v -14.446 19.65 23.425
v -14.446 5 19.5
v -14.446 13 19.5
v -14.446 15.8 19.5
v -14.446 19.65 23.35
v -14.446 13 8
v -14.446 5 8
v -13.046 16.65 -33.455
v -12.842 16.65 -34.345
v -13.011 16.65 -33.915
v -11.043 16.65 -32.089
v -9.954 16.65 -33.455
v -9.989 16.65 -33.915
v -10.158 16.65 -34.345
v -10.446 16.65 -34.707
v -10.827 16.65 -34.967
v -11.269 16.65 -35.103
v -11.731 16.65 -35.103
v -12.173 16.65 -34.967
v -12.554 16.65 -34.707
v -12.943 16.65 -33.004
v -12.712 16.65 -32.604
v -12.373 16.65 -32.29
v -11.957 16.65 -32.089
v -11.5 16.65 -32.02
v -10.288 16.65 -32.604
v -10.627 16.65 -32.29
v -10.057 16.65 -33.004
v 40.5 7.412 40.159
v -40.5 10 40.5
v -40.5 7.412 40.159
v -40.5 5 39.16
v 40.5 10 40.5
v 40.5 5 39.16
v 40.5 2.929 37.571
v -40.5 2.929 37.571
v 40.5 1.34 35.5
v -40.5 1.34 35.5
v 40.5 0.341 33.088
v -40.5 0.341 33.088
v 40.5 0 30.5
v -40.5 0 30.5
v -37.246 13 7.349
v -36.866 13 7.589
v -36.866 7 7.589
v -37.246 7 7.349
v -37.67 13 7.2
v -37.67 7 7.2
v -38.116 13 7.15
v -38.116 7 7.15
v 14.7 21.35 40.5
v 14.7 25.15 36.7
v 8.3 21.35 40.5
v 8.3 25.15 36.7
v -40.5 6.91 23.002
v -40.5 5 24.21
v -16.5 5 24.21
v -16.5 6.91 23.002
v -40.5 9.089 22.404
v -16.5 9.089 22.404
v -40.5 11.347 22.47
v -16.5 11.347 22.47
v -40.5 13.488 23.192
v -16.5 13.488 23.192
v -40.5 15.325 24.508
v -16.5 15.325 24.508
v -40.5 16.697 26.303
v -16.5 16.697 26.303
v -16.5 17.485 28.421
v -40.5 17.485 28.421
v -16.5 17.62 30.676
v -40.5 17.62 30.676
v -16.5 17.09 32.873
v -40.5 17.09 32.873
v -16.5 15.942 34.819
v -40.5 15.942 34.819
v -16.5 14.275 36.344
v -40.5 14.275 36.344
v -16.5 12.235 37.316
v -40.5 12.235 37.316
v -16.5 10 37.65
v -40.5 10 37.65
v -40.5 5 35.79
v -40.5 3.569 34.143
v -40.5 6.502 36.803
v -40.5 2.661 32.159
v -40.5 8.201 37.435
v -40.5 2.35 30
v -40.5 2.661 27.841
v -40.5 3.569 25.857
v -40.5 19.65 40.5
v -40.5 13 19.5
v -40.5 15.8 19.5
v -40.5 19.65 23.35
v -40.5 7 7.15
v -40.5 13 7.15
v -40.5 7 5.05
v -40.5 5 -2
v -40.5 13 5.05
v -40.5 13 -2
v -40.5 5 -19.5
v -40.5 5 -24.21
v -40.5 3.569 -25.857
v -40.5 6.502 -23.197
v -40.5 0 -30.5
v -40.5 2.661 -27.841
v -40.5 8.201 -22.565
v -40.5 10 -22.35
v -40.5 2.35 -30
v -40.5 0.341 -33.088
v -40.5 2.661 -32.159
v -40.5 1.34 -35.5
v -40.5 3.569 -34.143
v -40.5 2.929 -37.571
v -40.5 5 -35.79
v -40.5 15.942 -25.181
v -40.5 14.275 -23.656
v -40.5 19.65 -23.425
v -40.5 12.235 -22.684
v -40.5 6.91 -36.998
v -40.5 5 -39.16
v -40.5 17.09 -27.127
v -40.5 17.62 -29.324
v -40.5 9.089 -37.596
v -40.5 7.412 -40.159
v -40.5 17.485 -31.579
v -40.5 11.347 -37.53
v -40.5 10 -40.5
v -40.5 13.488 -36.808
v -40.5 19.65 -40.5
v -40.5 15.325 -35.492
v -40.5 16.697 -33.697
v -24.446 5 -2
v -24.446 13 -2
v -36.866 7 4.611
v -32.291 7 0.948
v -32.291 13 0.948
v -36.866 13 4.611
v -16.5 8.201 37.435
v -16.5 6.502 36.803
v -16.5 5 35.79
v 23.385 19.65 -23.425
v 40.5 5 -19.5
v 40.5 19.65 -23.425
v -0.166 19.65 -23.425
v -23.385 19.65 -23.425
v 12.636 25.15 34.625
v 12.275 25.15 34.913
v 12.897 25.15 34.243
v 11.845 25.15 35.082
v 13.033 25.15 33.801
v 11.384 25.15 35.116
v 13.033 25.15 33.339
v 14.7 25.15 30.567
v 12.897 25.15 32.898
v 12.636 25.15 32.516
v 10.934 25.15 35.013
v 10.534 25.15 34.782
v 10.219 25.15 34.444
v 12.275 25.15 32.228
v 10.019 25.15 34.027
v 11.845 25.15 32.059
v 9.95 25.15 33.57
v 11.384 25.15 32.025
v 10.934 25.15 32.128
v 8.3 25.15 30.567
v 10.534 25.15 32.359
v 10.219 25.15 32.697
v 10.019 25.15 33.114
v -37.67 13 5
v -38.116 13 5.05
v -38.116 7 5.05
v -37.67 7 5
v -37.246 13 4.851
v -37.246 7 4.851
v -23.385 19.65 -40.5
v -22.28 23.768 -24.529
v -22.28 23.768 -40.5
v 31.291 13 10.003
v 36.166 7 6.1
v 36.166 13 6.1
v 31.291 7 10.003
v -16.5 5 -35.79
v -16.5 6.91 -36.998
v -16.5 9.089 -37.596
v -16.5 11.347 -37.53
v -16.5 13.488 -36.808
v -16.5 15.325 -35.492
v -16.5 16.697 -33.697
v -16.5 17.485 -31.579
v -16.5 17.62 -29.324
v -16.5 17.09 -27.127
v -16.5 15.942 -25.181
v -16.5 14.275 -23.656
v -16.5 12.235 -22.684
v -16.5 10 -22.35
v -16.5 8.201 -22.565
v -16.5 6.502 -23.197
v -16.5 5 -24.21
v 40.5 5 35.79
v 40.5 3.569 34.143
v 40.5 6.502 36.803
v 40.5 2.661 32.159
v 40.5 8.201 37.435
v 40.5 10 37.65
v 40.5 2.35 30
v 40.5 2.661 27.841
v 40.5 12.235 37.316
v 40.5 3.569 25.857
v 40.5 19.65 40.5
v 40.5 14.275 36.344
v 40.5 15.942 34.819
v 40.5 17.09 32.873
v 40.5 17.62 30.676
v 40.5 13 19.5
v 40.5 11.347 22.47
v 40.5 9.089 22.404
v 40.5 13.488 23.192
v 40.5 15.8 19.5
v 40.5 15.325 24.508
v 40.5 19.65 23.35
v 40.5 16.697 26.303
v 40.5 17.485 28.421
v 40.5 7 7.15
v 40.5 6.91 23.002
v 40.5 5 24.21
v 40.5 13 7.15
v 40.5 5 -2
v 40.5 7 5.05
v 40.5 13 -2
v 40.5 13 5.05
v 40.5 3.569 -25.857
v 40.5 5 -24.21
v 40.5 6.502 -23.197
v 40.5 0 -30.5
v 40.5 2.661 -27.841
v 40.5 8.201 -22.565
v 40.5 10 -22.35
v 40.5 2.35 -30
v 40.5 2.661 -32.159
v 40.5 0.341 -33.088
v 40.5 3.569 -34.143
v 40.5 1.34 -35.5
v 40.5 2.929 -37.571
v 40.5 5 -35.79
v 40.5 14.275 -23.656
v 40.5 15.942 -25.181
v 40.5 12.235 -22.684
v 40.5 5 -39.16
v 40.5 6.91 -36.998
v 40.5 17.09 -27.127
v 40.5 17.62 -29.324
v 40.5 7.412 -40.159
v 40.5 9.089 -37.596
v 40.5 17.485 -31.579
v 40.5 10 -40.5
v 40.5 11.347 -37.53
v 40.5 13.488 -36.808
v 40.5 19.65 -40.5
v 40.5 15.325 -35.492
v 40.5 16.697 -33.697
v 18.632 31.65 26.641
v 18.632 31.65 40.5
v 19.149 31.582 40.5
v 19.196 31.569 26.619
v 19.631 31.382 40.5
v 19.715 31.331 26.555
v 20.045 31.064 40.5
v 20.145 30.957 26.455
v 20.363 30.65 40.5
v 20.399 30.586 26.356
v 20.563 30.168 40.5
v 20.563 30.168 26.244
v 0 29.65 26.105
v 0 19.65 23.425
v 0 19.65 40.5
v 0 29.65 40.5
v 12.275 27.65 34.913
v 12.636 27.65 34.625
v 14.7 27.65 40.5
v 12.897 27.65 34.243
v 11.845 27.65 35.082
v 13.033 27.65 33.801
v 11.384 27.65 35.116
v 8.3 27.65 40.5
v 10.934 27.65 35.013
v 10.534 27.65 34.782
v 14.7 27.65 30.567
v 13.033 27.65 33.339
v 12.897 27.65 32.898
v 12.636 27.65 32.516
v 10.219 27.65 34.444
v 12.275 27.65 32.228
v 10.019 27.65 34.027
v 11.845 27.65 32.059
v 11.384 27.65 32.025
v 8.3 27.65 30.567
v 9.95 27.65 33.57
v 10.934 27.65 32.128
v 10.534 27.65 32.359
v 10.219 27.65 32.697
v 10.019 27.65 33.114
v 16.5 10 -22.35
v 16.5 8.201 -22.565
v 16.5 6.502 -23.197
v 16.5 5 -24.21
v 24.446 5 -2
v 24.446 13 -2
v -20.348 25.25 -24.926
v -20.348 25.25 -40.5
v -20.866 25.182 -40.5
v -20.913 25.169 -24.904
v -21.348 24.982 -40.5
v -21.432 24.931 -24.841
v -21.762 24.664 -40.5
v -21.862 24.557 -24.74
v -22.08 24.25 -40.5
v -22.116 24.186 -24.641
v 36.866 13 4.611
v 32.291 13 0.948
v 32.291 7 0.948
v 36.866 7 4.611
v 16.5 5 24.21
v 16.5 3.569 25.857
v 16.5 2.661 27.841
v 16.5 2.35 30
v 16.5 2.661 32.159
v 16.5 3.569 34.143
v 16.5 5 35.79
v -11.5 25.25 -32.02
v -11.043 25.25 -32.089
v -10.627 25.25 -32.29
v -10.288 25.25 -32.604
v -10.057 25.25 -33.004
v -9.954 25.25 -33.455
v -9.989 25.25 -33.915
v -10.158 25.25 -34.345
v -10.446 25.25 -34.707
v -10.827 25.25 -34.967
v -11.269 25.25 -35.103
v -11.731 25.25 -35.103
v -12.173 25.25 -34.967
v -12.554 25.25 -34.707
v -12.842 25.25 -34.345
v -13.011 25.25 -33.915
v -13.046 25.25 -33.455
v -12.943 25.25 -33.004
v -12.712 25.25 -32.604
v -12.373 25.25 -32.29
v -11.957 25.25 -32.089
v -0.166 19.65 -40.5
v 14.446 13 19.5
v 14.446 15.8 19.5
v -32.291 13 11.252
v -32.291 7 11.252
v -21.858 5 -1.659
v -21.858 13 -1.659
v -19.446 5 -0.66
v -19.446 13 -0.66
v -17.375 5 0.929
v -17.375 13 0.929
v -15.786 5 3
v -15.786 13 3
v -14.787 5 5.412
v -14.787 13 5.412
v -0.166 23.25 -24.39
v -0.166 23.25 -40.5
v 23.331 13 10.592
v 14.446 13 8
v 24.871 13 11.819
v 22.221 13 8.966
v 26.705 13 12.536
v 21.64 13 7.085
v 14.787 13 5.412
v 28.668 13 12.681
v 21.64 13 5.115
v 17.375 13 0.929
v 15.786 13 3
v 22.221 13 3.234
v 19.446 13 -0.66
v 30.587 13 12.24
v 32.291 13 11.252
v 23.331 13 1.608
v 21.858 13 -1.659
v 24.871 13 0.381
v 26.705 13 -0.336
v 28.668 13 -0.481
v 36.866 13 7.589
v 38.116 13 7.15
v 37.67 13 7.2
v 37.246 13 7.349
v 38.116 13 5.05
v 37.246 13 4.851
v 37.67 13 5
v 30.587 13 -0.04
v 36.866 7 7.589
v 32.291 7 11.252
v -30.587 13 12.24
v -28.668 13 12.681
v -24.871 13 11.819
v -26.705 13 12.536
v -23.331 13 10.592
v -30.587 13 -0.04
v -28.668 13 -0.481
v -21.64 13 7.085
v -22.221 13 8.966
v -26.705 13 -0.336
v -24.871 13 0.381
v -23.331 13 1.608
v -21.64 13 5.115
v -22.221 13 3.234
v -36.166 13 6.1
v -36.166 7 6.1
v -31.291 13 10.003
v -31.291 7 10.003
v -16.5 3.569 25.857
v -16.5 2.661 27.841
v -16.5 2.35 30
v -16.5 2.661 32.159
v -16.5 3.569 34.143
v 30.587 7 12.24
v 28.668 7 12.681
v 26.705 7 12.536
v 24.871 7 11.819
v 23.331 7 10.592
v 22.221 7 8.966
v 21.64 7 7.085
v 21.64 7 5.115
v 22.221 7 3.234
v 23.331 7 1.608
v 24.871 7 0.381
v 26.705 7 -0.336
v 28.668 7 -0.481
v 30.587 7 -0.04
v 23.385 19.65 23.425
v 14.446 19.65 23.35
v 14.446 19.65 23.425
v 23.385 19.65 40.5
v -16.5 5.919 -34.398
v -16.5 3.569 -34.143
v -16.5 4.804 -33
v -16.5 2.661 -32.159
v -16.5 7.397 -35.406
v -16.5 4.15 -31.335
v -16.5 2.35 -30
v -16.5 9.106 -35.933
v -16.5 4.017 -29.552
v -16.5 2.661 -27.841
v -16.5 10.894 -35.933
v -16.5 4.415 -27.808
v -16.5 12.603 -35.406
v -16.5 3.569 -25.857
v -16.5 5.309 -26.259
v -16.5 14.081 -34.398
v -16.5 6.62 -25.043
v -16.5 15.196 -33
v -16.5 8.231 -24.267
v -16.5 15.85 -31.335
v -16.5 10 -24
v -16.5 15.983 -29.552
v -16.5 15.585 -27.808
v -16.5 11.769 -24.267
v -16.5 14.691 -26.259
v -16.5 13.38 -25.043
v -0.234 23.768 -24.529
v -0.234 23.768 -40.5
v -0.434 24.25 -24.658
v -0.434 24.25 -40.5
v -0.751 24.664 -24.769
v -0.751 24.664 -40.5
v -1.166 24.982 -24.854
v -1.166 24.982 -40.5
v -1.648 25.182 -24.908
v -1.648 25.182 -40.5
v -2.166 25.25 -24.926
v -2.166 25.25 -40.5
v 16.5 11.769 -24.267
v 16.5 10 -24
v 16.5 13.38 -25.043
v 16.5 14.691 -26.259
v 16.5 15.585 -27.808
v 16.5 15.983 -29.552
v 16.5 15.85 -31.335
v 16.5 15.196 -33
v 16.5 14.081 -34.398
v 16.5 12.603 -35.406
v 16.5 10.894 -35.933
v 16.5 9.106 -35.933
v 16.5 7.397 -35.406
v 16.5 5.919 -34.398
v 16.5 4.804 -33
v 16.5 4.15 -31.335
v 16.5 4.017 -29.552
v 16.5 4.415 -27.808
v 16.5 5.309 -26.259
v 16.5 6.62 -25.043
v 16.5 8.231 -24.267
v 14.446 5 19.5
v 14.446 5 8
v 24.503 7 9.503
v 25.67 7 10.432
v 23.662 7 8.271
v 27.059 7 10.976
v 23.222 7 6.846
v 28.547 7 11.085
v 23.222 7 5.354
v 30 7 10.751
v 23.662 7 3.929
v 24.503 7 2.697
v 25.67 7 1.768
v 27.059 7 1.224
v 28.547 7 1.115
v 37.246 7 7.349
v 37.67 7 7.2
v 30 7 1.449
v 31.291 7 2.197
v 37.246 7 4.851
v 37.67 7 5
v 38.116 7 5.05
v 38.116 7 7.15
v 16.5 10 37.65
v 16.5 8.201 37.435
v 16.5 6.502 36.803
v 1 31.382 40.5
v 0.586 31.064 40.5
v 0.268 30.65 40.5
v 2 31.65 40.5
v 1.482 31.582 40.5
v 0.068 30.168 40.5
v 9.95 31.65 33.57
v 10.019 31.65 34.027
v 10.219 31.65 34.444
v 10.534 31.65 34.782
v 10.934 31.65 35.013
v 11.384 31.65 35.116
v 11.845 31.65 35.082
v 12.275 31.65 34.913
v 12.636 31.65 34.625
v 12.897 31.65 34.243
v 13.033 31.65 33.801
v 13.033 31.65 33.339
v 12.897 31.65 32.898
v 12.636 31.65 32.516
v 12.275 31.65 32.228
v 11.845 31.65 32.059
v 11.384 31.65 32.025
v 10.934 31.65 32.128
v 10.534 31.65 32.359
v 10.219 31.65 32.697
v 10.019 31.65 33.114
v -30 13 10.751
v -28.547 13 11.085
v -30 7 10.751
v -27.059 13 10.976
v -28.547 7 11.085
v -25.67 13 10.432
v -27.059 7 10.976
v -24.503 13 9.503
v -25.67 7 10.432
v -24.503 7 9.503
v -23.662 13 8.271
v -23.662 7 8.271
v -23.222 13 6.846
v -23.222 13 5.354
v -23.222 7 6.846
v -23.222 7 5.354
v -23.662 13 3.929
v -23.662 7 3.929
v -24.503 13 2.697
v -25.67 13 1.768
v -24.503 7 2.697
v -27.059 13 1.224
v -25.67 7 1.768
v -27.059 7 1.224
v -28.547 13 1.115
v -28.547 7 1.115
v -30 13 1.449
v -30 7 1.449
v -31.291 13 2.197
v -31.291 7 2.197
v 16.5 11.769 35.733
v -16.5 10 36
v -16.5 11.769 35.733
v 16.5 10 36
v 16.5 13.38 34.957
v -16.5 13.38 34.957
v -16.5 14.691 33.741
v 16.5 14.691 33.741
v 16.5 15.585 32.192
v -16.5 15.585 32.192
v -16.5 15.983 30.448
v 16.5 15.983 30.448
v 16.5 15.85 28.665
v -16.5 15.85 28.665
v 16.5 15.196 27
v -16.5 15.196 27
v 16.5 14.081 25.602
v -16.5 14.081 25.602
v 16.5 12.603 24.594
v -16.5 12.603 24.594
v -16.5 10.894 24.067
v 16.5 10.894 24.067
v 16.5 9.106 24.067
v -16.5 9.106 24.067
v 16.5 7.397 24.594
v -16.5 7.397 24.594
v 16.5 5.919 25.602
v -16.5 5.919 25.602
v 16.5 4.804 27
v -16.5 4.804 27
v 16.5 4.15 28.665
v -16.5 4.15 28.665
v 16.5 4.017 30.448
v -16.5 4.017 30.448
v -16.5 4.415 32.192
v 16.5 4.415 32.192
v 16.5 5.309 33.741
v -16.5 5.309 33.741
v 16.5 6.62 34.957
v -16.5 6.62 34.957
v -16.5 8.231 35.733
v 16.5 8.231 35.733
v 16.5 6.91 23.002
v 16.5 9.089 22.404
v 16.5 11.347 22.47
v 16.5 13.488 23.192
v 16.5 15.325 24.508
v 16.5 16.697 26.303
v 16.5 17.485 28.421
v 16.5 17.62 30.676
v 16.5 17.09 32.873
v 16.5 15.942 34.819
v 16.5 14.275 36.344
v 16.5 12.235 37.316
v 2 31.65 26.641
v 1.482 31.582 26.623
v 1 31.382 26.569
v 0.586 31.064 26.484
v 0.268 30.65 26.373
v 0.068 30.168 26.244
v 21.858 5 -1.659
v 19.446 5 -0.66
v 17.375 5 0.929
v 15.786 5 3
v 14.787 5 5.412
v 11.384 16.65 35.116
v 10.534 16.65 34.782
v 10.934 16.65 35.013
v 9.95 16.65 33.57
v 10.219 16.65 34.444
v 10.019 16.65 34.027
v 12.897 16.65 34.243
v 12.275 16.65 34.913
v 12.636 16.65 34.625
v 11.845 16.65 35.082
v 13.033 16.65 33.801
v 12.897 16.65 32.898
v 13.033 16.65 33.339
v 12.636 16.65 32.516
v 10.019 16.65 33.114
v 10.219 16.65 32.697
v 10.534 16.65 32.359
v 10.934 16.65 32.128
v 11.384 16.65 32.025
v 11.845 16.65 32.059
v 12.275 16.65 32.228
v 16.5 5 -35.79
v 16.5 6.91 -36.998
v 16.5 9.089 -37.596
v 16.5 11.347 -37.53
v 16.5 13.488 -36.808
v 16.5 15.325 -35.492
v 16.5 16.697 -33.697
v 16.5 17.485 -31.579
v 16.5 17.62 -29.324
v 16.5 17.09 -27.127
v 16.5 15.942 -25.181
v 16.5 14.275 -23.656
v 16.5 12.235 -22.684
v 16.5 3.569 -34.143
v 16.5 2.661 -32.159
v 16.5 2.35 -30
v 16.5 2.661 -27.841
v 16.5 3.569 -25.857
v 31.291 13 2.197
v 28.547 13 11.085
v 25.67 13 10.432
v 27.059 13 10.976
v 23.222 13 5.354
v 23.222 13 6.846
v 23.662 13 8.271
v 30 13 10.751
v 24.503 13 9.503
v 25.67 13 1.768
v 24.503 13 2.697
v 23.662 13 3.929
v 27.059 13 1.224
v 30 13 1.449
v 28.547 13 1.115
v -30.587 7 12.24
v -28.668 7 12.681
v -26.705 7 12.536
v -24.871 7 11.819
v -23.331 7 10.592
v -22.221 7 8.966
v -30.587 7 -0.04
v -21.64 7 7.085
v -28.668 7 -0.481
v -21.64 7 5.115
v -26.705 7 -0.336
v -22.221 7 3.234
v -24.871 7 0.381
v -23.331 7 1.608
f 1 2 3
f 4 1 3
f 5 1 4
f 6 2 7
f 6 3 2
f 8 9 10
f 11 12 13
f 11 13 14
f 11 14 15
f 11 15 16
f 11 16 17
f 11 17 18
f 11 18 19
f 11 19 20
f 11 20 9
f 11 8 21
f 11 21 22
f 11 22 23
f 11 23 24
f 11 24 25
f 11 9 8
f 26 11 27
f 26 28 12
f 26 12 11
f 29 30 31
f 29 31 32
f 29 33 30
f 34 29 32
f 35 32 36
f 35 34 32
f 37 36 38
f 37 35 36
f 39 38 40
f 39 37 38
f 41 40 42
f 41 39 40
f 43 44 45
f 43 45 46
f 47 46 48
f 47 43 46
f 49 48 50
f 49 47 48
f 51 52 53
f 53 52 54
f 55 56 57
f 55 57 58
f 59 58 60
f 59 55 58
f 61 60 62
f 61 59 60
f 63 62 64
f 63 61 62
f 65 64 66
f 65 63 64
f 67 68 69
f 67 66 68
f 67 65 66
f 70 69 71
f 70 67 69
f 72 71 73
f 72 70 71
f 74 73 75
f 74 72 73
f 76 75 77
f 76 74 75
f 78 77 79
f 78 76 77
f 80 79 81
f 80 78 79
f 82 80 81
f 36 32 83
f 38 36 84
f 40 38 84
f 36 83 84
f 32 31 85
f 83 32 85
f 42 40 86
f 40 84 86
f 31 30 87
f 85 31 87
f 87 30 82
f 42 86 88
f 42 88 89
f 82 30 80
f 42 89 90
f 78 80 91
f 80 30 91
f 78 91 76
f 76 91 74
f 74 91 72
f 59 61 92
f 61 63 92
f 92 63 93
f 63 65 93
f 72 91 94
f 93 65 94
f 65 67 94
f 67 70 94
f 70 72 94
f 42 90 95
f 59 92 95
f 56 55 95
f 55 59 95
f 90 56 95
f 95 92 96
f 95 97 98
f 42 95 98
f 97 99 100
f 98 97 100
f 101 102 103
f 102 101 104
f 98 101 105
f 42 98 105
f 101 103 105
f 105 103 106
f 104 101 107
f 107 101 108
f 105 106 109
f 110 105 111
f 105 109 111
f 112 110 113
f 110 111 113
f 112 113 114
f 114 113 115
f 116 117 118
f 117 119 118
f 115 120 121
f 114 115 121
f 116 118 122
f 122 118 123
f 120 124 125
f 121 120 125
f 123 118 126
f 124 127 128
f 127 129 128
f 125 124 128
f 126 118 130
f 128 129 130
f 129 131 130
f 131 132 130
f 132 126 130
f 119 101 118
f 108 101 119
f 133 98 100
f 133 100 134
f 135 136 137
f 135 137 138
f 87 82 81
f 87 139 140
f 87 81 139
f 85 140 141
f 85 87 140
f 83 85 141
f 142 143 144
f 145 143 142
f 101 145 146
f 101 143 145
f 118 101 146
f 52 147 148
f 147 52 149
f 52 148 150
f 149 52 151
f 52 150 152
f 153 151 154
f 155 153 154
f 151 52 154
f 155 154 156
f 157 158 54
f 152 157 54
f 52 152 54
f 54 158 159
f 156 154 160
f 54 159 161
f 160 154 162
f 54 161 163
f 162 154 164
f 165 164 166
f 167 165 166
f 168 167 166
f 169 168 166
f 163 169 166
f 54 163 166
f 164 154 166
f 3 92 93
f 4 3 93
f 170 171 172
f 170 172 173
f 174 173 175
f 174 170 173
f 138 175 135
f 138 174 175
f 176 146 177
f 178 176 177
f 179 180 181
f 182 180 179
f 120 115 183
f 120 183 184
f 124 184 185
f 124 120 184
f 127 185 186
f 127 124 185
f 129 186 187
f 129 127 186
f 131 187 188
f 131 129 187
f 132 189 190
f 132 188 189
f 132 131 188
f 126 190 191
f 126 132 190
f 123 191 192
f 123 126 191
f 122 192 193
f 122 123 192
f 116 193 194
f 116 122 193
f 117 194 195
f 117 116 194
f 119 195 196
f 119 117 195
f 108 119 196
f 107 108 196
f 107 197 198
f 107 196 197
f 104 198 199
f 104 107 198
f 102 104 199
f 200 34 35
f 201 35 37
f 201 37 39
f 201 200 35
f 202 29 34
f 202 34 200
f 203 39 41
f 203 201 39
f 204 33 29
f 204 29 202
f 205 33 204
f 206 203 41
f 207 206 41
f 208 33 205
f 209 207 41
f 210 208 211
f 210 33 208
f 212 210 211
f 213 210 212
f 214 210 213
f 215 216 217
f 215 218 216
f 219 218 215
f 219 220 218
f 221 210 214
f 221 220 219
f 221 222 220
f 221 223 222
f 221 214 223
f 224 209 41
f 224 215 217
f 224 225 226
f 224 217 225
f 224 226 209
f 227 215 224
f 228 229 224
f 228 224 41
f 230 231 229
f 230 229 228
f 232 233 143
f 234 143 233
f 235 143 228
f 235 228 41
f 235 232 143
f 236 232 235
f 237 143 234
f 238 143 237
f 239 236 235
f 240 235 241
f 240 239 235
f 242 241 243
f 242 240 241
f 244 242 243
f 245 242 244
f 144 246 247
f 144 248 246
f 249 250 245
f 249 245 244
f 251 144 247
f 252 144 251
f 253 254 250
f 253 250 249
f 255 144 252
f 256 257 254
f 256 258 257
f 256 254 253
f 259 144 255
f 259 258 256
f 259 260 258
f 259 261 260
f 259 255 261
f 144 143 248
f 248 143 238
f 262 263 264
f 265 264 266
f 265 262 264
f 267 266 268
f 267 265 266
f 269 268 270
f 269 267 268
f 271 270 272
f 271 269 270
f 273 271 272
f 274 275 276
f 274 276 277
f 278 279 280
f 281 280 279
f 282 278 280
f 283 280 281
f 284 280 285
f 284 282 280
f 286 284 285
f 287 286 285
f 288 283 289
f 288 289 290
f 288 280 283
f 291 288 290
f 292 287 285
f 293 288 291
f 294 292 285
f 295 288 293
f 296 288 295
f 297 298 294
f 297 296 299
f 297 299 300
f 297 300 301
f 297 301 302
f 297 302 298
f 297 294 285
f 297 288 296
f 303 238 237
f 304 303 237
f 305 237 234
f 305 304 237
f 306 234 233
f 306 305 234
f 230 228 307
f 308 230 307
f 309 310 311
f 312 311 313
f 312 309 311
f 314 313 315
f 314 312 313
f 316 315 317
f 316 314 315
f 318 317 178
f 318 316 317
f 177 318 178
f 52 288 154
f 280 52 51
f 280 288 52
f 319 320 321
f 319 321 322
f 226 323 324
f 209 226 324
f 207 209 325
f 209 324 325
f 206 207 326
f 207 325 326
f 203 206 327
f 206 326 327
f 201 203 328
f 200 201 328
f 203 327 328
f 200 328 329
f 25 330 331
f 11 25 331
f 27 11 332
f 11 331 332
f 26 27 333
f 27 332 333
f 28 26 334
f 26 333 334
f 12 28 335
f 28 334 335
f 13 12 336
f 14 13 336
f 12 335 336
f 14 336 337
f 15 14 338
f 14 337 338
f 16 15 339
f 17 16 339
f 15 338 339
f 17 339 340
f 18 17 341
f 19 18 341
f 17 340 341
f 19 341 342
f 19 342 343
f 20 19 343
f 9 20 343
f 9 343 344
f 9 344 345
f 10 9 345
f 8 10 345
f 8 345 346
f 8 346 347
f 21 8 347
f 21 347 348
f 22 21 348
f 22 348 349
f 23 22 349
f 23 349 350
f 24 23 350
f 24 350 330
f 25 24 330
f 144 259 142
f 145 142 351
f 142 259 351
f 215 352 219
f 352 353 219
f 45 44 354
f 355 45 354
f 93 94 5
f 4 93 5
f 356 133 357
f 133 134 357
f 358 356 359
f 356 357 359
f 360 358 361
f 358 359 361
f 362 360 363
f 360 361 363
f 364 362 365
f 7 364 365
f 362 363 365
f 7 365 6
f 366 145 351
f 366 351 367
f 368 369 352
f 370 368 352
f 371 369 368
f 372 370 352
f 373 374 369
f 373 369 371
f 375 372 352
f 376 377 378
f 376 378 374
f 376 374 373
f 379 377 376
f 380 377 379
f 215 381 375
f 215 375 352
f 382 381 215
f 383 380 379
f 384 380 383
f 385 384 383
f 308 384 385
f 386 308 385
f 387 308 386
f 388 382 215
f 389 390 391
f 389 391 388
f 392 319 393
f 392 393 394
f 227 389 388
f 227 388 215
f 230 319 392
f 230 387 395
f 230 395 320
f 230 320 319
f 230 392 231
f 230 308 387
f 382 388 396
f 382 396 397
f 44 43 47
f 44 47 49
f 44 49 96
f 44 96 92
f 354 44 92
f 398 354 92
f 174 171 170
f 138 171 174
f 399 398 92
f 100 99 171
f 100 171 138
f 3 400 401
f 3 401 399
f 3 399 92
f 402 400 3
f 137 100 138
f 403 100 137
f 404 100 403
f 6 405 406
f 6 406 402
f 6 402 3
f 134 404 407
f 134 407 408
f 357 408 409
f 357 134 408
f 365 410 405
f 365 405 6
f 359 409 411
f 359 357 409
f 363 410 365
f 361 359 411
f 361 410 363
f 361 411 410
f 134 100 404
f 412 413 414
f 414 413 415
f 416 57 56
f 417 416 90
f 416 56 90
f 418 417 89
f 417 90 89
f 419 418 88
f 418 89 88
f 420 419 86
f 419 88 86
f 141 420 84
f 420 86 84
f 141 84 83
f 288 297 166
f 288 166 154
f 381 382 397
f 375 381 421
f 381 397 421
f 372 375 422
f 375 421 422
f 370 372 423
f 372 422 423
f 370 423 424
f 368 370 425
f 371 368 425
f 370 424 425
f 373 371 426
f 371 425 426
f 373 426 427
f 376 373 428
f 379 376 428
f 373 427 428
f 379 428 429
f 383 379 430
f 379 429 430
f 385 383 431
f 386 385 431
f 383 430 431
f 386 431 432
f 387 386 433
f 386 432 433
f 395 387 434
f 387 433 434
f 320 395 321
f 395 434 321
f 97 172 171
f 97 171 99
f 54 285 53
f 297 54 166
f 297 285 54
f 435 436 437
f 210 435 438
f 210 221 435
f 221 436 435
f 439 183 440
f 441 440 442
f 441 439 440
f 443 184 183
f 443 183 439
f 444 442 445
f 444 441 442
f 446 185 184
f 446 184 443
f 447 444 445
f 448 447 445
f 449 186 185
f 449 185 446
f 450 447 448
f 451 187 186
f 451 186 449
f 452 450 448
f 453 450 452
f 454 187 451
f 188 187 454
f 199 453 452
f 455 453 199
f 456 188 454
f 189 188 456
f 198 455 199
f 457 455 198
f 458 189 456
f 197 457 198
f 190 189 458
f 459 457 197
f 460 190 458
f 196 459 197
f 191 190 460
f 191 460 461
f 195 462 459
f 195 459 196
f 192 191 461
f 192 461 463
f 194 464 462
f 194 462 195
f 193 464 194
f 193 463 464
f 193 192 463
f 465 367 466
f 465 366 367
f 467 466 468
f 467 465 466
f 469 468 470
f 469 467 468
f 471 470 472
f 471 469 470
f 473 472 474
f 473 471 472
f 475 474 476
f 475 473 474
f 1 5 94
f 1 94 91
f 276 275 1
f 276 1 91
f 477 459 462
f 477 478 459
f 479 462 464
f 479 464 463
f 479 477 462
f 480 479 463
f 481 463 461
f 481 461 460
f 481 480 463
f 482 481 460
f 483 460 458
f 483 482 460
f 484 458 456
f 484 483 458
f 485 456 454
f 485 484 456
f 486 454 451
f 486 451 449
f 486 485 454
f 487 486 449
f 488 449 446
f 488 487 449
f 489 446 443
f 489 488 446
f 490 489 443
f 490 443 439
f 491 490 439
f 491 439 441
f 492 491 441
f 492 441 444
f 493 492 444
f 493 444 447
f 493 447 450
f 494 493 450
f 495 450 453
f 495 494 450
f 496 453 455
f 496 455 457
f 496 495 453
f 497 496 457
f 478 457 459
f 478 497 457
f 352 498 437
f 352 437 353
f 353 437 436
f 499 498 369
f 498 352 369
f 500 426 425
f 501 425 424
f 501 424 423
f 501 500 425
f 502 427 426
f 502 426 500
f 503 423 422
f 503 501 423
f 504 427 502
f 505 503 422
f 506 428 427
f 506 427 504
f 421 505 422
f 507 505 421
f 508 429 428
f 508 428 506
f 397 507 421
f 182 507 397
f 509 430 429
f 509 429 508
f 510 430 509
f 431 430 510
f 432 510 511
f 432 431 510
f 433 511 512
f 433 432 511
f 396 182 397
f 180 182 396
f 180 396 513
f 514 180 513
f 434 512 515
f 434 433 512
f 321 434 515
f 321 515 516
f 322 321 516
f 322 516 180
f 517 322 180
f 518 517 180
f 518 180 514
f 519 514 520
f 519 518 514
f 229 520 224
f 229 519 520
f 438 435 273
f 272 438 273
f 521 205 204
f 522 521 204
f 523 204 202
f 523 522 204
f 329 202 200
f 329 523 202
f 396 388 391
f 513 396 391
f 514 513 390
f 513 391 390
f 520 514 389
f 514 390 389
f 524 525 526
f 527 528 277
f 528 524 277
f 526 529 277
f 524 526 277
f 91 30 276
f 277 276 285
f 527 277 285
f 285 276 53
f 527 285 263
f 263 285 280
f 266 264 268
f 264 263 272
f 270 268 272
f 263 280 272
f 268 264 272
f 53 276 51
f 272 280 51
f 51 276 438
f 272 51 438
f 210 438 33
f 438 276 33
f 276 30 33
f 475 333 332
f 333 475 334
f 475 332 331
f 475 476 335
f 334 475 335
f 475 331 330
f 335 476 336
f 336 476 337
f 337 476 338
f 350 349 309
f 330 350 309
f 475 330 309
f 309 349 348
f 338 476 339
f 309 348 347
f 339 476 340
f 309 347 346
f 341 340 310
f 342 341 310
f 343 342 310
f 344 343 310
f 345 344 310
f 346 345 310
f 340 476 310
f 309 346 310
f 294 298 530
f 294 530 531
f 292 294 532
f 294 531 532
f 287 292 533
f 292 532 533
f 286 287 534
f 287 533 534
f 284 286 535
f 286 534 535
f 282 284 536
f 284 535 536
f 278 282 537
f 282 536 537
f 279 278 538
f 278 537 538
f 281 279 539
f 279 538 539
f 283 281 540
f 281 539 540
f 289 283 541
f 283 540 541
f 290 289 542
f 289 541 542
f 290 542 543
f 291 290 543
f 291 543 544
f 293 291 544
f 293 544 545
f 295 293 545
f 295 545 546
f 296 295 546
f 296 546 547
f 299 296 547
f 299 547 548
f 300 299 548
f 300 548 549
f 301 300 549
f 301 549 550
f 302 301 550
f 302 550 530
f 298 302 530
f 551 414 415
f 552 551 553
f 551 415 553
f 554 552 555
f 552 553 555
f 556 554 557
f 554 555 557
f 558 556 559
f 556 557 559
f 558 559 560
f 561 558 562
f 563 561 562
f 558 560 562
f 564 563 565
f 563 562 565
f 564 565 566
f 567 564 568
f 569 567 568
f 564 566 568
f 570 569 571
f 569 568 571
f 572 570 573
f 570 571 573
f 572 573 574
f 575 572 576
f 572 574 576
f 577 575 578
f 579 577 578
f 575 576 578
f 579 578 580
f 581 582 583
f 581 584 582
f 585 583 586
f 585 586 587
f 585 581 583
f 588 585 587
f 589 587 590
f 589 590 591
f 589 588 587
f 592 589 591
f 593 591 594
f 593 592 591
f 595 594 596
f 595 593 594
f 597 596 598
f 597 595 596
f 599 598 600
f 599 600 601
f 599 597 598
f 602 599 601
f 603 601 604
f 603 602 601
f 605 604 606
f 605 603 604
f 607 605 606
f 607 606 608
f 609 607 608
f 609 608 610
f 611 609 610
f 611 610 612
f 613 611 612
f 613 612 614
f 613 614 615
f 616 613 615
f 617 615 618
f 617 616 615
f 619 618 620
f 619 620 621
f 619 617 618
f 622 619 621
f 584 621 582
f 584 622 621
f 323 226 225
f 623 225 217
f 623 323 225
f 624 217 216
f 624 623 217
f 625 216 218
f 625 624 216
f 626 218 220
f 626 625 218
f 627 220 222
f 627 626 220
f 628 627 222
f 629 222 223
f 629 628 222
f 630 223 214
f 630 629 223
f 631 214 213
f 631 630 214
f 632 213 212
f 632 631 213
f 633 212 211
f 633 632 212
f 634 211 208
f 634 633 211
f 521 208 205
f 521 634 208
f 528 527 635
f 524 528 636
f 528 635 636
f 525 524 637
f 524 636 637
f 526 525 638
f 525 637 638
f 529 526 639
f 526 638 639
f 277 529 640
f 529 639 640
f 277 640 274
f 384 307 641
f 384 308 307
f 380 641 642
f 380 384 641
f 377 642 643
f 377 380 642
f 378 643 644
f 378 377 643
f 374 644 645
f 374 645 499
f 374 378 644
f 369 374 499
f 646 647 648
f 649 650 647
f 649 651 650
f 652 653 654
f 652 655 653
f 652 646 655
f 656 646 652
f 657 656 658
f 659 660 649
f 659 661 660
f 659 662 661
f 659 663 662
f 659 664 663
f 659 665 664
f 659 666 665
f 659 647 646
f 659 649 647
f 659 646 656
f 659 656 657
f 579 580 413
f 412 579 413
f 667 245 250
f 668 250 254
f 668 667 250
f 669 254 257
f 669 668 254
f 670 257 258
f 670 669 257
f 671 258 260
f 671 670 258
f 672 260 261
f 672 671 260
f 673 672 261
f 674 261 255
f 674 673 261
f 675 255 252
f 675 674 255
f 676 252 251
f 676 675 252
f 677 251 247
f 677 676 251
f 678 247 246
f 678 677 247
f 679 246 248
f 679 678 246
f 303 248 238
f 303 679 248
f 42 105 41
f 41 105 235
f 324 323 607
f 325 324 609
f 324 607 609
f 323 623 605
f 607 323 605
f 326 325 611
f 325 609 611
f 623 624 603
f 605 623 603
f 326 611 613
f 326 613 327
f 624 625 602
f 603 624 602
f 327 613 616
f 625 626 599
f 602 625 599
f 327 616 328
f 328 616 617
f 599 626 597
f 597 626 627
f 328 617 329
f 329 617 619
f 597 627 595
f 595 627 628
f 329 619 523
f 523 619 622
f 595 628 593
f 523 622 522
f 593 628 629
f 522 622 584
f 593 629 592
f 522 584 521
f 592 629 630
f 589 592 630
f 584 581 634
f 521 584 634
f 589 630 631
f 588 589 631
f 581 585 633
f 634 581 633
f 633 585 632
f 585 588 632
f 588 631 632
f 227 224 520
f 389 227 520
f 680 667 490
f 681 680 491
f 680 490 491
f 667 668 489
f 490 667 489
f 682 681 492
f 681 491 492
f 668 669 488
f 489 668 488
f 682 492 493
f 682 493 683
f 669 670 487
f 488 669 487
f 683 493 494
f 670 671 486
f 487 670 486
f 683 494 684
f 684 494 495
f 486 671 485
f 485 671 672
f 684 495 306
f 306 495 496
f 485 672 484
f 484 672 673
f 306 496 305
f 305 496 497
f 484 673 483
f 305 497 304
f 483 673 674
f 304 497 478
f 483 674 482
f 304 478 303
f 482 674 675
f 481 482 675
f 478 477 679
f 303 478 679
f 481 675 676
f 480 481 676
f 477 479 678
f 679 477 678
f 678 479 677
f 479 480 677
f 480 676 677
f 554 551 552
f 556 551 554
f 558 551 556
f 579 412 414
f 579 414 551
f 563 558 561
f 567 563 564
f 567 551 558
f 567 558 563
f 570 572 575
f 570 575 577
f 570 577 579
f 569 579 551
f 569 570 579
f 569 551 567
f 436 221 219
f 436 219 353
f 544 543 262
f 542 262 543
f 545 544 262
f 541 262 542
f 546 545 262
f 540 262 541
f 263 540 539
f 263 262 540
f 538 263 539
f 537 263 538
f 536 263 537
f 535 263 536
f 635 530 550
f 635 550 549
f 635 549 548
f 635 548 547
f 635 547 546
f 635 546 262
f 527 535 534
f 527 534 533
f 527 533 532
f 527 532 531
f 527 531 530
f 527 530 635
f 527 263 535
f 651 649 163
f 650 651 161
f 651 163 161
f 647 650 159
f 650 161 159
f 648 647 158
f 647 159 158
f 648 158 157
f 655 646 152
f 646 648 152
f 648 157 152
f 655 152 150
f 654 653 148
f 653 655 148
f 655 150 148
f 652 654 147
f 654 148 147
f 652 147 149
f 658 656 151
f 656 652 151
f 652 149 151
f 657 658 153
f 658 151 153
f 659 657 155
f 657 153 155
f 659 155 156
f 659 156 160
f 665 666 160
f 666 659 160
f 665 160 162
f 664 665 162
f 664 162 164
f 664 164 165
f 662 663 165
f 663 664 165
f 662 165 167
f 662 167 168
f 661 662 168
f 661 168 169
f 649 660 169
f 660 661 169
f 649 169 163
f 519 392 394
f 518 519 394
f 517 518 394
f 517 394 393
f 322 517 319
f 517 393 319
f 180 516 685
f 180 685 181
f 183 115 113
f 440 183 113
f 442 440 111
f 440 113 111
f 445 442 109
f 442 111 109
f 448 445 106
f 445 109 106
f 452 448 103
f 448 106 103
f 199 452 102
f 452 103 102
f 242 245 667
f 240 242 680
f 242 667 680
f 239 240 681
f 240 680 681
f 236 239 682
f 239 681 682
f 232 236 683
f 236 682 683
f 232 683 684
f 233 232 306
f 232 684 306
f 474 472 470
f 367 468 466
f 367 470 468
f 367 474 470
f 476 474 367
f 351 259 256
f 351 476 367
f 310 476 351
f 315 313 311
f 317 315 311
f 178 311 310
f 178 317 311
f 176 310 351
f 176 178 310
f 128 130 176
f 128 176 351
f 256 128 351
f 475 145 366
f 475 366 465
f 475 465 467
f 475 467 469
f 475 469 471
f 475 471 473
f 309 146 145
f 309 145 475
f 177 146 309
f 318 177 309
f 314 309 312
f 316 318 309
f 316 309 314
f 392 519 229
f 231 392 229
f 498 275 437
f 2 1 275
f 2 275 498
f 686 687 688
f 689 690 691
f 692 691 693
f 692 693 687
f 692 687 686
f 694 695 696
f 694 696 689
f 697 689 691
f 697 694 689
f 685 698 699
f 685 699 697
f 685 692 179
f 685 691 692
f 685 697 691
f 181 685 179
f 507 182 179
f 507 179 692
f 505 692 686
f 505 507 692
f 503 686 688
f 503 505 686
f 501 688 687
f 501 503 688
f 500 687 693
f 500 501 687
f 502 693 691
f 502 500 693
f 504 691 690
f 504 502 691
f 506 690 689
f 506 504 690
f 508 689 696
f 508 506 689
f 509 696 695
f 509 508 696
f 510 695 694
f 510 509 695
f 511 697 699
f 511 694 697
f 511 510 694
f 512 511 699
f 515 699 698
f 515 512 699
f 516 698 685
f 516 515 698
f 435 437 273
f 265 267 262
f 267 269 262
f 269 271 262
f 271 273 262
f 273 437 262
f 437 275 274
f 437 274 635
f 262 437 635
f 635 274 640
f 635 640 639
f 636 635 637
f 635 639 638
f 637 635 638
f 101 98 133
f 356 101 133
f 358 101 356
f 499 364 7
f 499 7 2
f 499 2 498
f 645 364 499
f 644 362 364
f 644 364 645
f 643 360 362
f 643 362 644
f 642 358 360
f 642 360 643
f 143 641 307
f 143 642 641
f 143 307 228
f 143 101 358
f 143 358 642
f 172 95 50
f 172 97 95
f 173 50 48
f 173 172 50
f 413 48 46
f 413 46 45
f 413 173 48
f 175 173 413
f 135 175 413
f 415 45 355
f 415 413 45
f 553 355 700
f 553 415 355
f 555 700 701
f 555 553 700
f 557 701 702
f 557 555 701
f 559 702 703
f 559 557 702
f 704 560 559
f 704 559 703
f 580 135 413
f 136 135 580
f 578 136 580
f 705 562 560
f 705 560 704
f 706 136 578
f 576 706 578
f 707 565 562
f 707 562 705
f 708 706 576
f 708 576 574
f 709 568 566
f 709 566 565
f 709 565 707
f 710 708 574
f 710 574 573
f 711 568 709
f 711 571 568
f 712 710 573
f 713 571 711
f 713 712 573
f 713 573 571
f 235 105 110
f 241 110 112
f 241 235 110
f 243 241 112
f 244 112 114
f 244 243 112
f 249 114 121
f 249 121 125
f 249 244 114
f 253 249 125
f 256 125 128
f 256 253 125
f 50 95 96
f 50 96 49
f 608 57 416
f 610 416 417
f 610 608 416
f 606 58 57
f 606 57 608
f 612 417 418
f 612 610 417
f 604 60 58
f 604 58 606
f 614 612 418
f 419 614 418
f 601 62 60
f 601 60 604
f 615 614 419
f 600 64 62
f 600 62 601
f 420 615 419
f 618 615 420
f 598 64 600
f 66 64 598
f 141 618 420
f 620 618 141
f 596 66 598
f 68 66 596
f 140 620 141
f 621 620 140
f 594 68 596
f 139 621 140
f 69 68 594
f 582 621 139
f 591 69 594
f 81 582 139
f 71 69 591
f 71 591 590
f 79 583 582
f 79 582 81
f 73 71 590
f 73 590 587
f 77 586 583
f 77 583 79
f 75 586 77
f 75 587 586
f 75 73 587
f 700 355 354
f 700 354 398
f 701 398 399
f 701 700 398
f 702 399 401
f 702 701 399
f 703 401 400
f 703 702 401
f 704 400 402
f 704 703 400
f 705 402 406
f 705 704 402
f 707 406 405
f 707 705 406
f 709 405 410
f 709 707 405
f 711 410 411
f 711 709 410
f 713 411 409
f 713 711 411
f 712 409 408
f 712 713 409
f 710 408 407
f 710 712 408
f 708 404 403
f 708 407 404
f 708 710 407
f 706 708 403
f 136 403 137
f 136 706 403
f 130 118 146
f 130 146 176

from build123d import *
from build123d.topology import SkipClean

# Parameters (mm, degrees)
SKETCH1_W                = 81
SKETCH1_H                = 81
BOSS_EXTRUDE1_DEPTH      = 5
BOSS_EXTRUDE3_DEPTH      = 81
SKETCH4_R                = 7.65
CUT_EXTRUDE2_DEPTH       = 93.668077028
BOSS_EXTRUDE4_DEPTH      = 10
BOSS_EXTRUDE6_DEPTH      = 26.053662708
CHAMFER1_SIZE            = 3.85
CHAMFER1_OF_MIRROR1_SIZE = 3.85
FILLET2_R                = 2
FILLET3_R                = 10
SKETCH8_R                = 7.65
SKETCH8_R_2              = 6
BOSS_EXTRUDE7_DEPTH      = 16.5
BOSS_EXTRUDE8_REACH      = 94.668
BOSS_EXTRUDE9_REACH      = 97.932
SKETCH11_R               = 1.55
CUT_EXTRUDE3_DEPTH       = 15
CUT_EXTRUDE4_DEPTH       = 2
BOSS_EXTRUDE10_START     = 2
BOSS_EXTRUDE10_DEPTH     = 2
FILLET4_R                = 10
CUT_EXTRUDE5_REACH       = 97.932
FILLET5_R                = 2
FILLET6_R                = 2
FILLET7_R                = 2
CUT_EXTRUDE6_DEPTH       = 2.5
CHAMFER2_SIZE            = 3.8
CUT_EXTRUDE7_REACH       = 97.932
SKETCH17_W               = 23.385
SKETCH17_H               = 12
CUT_EXTRUDE8_REACH       = 97.932
SKETCH19_W               = 23.550689655
SKETCH19_H               = 12
FILLET8_R                = 2


with BuildPart() as part:
    # Sketch1 → Boss-Extrude1 (new body)
    with BuildSketch(Plane(origin=(0, 0, 0), x_dir=(1, 0, 0), z_dir=(0, 1, 0))):
        Rectangle(SKETCH1_W, SKETCH1_H)
    extrude(amount=BOSS_EXTRUDE1_DEPTH)

    # Sketch2 → Boss-Extrude3 (add)
    with BuildSketch(Plane.ZY.offset(40.5)):
        with BuildLine():
            Line((-24.210138171, 5), (-19.5, 5))
            Line((-19.5, 5), (-23.425455669, 19.65))
            Line((-23.425455669, 19.65), (-40.5, 19.65))
            Line((-40.5, 19.65), (-40.5, 5))
            Line((-40.5, 5), (-35.789861829, 5))
            ThreePointArc((-35.789861829, 5), (-32.667401077, 17.169900383), (-22.35, 10))
            ThreePointArc((-22.35, 10), (-22.830099617, 7.332598923), (-24.210138171, 5))
        make_face()
        with BuildLine():
            Line((23.425455669, 19.65), (19.5, 5))
            Line((19.5, 5), (24.210138171, 5))
            ThreePointArc((24.210138171, 5), (27.332598923, 17.169900383), (37.65, 10))
            ThreePointArc((37.65, 10), (37.169900383, 7.332598923), (35.789861829, 5))
            Line((35.789861829, 5), (40.5, 5))
            Line((40.5, 5), (40.5, 19.65))
            Line((40.5, 19.65), (23.425455669, 19.65))
        make_face()
    extrude(amount=-BOSS_EXTRUDE3_DEPTH)

    # Sketch4 → Cut-Extrude2 (cut, through all)
    with SkipClean():  # the faces are left unmerged after this step: merging them gives an invalid solid
        with BuildSketch(Plane.ZY.offset(40.5)):
            with Locations((-30, 10)):
                Circle(SKETCH4_R)
            with Locations((30, 10)):
                Circle(SKETCH4_R)
        extrude(amount=-CUT_EXTRUDE2_DEPTH, mode=Mode.SUBTRACT)

    # Sketch6 → Boss-Extrude4 (add)
    with SkipClean():  # the faces are left unmerged after this step: merging them gives an invalid solid
        with BuildSketch(Plane(origin=(0, 5, 0), x_dir=(1, 0, 0), z_dir=(0, 1, 0))):
            with BuildLine():
                Line((-32.290875523, -0.947876651), (-37.414425943, -5.05))
                Line((-37.414425943, -5.05), (-40.5, -5.05))
                Line((-40.5, -5.05), (-40.5, 2))
                Line((-40.5, 2), (-14.446337292, 2))
                Line((-14.446337292, 2), (-14.446337292, -19.5))
                Line((-14.446337292, -19.5), (-40.5, -19.5))
                Line((-40.5, -19.5), (-40.5, -7.15))
                Line((-40.5, -7.15), (-37.414425943, -7.15))
                Line((-37.414425943, -7.15), (-32.290875523, -11.252123349))
                ThreePointArc((-32.290875523, -11.252123349), (-21.565875523, -6.1), (-32.290875523, -0.947876651))
            make_face()
            with BuildLine():
                Line((-31.290875523, -2.196876251), (-36.165875523, -6.1))
                Line((-36.165875523, -6.1), (-31.290875523, -10.003123749))
                ThreePointArc((-31.290875523, -10.003123749), (-23.165875523, -6.1), (-31.290875523, -2.196876251))
            make_face()
        boss_extrude4 = extrude(amount=BOSS_EXTRUDE4_DEPTH)

    # Sketch7 → Boss-Extrude6 (add)
    with SkipClean():  # the faces are left unmerged after this step: merging them gives an invalid solid
        with BuildSketch(Plane.ZY.offset(40.5)):
            Polygon((19.5, 5), (19.5, 19.65), (23.425455669, 19.65), align=None)
        boss_extrude6 = extrude(amount=-BOSS_EXTRUDE6_DEPTH)

    # Chamfer1
    chamfer1_edges = [part.edges().sort_by_distance(p)[0] for p in [
        (-27.473168646, 19.65, 19.5),
    ]]
    chamfer(chamfer1_edges, length=CHAMFER1_SIZE)

    # Mirror1: Boss-Extrude4, Boss-Extrude6 across plane
    with SkipClean():  # the faces are left unmerged after this step: merging them gives an invalid solid
        add(boss_extrude4.mirror(Plane.ZY))
        add(boss_extrude6.mirror(Plane.ZY))

    # Chamfer1 of Mirror1
    chamfer1_of_mirror1_edges = [part.edges().sort_by_distance(p)[0] for p in [
        (27.473168646, 19.65, 19.5),
    ]]
    chamfer(chamfer1_of_mirror1_edges, length=CHAMFER1_OF_MIRROR1_SIZE)

    # Fillet2
    fillet2_edges = [part.edges().sort_by_distance(p)[0] for p in [
        (37.414425943, 10, 7.15),
        (37.414425943, 10, 5.05),
        (-37.414425943, 10, 7.15),
        (-37.414425943, 10, 5.05),
    ]]
    fillet(fillet2_edges, radius=FILLET2_R)

    # Fillet3
    fillet3_edges = [part.edges().sort_by_distance(p)[0] for p in [
        (0, 0, 40.5),
        (0, 0, -40.5),
    ]]
    fillet(fillet3_edges, radius=FILLET3_R)

    # Sketch8 → Boss-Extrude7 (add, symmetric)
    # profile 1 of 2: a face of its own
    with SkipClean():  # the faces are left unmerged after this step: merging them gives an invalid solid
        with BuildSketch(Plane.ZY):
            with Locations((30, 10)):
                Circle(SKETCH8_R)
            with Locations((30, 10)):
                Circle(SKETCH8_R_2, mode=Mode.SUBTRACT)
        # profile 2 of 2: a face of its own
        with BuildSketch(Plane.ZY):
            with Locations((-30, 10)):
                Circle(SKETCH8_R)
            with Locations((-30, 10)):
                Circle(SKETCH8_R_2, mode=Mode.SUBTRACT)
        extrude(amount=BOSS_EXTRUDE7_DEPTH, both=True)

    # Boss-Extrude8: up to this plane
    with SkipClean():  # the faces are left unmerged after this step: merging them gives an invalid solid
        boss_extrude8_end = Plane(origin=(66.10512644, -4.540063509, 16.943747687), z_dir=(0, -0.25881904510252485, 0.9659258262890673))
        # Sketch9 → Boss-Extrude8 (add, up to the surface)
        with BuildSketch(Plane.XY.offset(40.5), mode=Mode.PRIVATE) as boss_extrude8_sk1:
            Polygon((-20.165689655, 31.65), (-23.385, 19.65), (23.385, 19.65), (20.165689655, 31.65), align=None)
        boss_extrude8_tool1 = split(extrude(boss_extrude8_sk1.sketch, amount=-BOSS_EXTRUDE8_REACH, mode=Mode.PRIVATE), bisect_by=boss_extrude8_end, keep=Keep.BOTH, mode=Mode.PRIVATE)
        add(boss_extrude8_tool1.solids().sort_by_distance((0, 25.502158, 40.5))[0])

    # Boss-Extrude9: up to this plane
    with SkipClean():  # the faces are left unmerged after this step: merging them gives an invalid solid
        boss_extrude9_end = Plane(origin=(66.10512644, -4.540063509, -16.943747687), z_dir=(0, 0.25881904510252485, 0.9659258262890673))
        # Sketch10 → Boss-Extrude9 (add, up to the surface)
        with BuildSketch(Plane(origin=(0, 0, -40.5), x_dir=(-1, 0, 0), z_dir=(0, 0, -1)), mode=Mode.PRIVATE) as boss_extrude9_sk1:
            Polygon((23.385, 19.65), (20.165689655, 31.65), (-20.165689655, 31.65), (-23.385, 19.65), align=None)
        boss_extrude9_tool1 = split(extrude(boss_extrude9_sk1.sketch, amount=-BOSS_EXTRUDE9_REACH, mode=Mode.PRIVATE), bisect_by=boss_extrude9_end, keep=Keep.BOTH, mode=Mode.PRIVATE)
        add(boss_extrude9_tool1.solids().sort_by_distance((0, 25.502158, -40.5))[0])

    # Sketch11 → Cut-Extrude3 (cut)
    with SkipClean():  # the faces are left unmerged after this step: merging them gives an invalid solid
        with BuildSketch(Plane(origin=(0, 31.65, 0), x_dir=(1, 0, 0), z_dir=(0, 1, 0))):
            with Locations(Location((-11.5, 33.570422989, 0), (0, 0, 270))):
                Circle(SKETCH11_R)
            with BuildLine():
                ThreePointArc((13.05, -33.570422989), (11.5, -32.020422989), (9.95, -33.570422989))
                Line((9.95, -33.570422989), (13.05, -33.570422989))
            make_face()
            with BuildLine():
                Line((13.05, -33.570422989), (9.95, -33.570422989))
                ThreePointArc((9.95, -33.570422989), (11.5, -35.120422989), (13.05, -33.570422989))
            make_face()
        extrude(amount=-CUT_EXTRUDE3_DEPTH, mode=Mode.SUBTRACT)

    # Sketch12 → Cut-Extrude4 (cut)
    with SkipClean():  # the faces are left unmerged after this step: merging them gives an invalid solid
        with BuildSketch(Plane(origin=(0, 15, 0), x_dir=(1, 0, 0), z_dir=(0, 1, 0))):
            with BuildLine():
                Line((31.290875523, -10.003123749), (36.165875523, -6.1))
                Line((36.165875523, -6.1), (31.290875523, -2.196876251))
                ThreePointArc((31.290875523, -2.196876251), (23.165875523, -6.1), (31.290875523, -10.003123749))
            make_face()
            with BuildLine():
                Line((-36.165875523, -6.1), (-31.290875523, -10.003123749))
                ThreePointArc((-31.290875523, -10.003123749), (-23.165875523, -6.1), (-31.290875523, -2.196876251))
                Line((-31.290875523, -2.196876251), (-36.165875523, -6.1))
            make_face()
            with BuildLine():
                Line((32.290875523, -0.947876651), (36.866426744, -4.6112495))
                ThreePointArc((36.866426744, -4.6112495), (37.454044301, -4.937127314), (38.116426744, -5.05))
                Line((38.116426744, -5.05), (40.5, -5.05))
                Line((40.5, -5.05), (40.5, 2))
                Line((40.5, 2), (14.446337292, 2))
                Line((14.446337292, 2), (14.446337292, -19.5))
                Line((14.446337292, -19.5), (40.5, -19.5))
                Line((40.5, -19.5), (40.5, -7.15))
                Line((40.5, -7.15), (38.116426744, -7.15))
                ThreePointArc((38.116426744, -7.15), (37.454044301, -7.262872686), (36.866426744, -7.5887505))
                Line((36.866426744, -7.5887505), (32.290875523, -11.252123349))
                ThreePointArc((32.290875523, -11.252123349), (21.565875523, -6.1), (32.290875523, -0.947876651))
            make_face()
            with BuildLine():
                Line((-32.290875523, -11.252123349), (-36.866426744, -7.5887505))
                ThreePointArc((-36.866426744, -7.5887505), (-37.454044301, -7.262872686), (-38.116426744, -7.15))
                Line((-38.116426744, -7.15), (-40.5, -7.15))
                Line((-40.5, -7.15), (-40.5, -19.5))
                Line((-40.5, -19.5), (-14.446337292, -19.5))
                Line((-14.446337292, -19.5), (-14.446337292, 2))
                Line((-14.446337292, 2), (-40.5, 2))
                Line((-40.5, 2), (-40.5, -5.05))
                Line((-40.5, -5.05), (-38.116426744, -5.05))
                ThreePointArc((-38.116426744, -5.05), (-37.454044301, -4.937127314), (-36.866426744, -4.6112495))
                Line((-36.866426744, -4.6112495), (-32.290875523, -0.947876651))
                ThreePointArc((-32.290875523, -0.947876651), (-21.565875523, -6.1), (-32.290875523, -11.252123349))
            make_face()
        extrude(amount=-CUT_EXTRUDE4_DEPTH, mode=Mode.SUBTRACT)

    # Sketch13 → Boss-Extrude10 (add)
    with SkipClean():  # the faces are left unmerged after this step: merging them gives an invalid solid
        with BuildSketch(Plane(origin=(0, 5, 0), x_dir=(1, 0, 0), z_dir=(0, 1, 0)).offset(BOSS_EXTRUDE10_START)):
            with BuildLine():
                Line((32.290875523, -11.252123349), (36.866426744, -7.5887505))
                ThreePointArc((36.866426744, -7.5887505), (37.454044301, -7.262872686), (38.116426744, -7.15))
                Line((38.116426744, -7.15), (40.5, -7.15))
                Line((40.5, -7.15), (40.5, -5.05))
                Line((40.5, -5.05), (38.116426744, -5.05))
                ThreePointArc((38.116426744, -5.05), (37.454044301, -4.937127314), (36.866426744, -4.6112495))
                Line((36.866426744, -4.6112495), (32.290875523, -0.947876651))
                ThreePointArc((32.290875523, -0.947876651), (21.565875523, -6.1), (32.290875523, -11.252123349))
            make_face()
            with BuildLine():
                Line((-40.5, -7.15), (-38.116426744, -7.15))
                ThreePointArc((-38.116426744, -7.15), (-37.454044301, -7.262872686), (-36.866426744, -7.5887505))
                Line((-36.866426744, -7.5887505), (-32.290875523, -11.252123349))
                ThreePointArc((-32.290875523, -11.252123349), (-21.565875523, -6.1), (-32.290875523, -0.947876651))
                Line((-32.290875523, -0.947876651), (-36.866426744, -4.6112495))
                ThreePointArc((-36.866426744, -4.6112495), (-37.454044301, -4.937127314), (-38.116426744, -5.05))
                Line((-38.116426744, -5.05), (-40.5, -5.05))
                Line((-40.5, -5.05), (-40.5, -7.15))
            make_face()
        extrude(amount=-BOSS_EXTRUDE10_DEPTH)

    # Fillet4
    fillet4_edges = [part.edges().sort_by_distance(p)[0] for p in [
        (14.446337292, 9, -2),
        (-14.446337292, 9, -2),
    ]]
    fillet(fillet4_edges, radius=FILLET4_R)

    # Cut-Extrude5: up to this plane
    with SkipClean():  # the faces are left unmerged after this step: merging them gives an invalid solid
        cut_extrude5_end = Plane(origin=(66.10512644, -4.540063509, -16.943747687), z_dir=(0, 0.25881904510252485, 0.9659258262890673))
        # Sketch15 → Cut-Extrude5 (cut, up to the surface)
        with BuildSketch(Plane(origin=(0, 0, -40.5), x_dir=(-1, 0, 0), z_dir=(0, 0, -1)), mode=Mode.PRIVATE) as cut_extrude5_sk1:
            Polygon((20.165689655, 31.65), (0.165689655, 31.65), (0.165689655, 25.25), (21.882655172, 25.25), align=None)
        cut_extrude5_tool1 = split(extrude(cut_extrude5_sk1.sketch, amount=-CUT_EXTRUDE5_REACH, mode=Mode.PRIVATE), bisect_by=cut_extrude5_end, keep=Keep.BOTH, mode=Mode.PRIVATE)
        add(cut_extrude5_tool1.solids().sort_by_distance((-10.60082, 28.406099, -40.5))[0], mode=Mode.SUBTRACT)

    # Fillet5
    fillet5_edges = [part.edges().sort_by_distance(p)[0] for p in [
        (-0.165689655, 31.65, -33.570422989),
    ]]
    fillet(fillet5_edges, radius=FILLET5_R)

    # Fillet6
    fillet6_edges = [part.edges().sort_by_distance(p)[0] for p in [
        (20.165689655, 31.65, 33.570422989),
        (-20.165689655, 31.65, 33.570422989),
        (20.165689655, 31.65, -33.570422989),
    ]]
    fillet(fillet6_edges, radius=FILLET6_R)

    # Fillet7
    fillet7_edges = [part.edges().sort_by_distance(p)[0] for p in [
        (-21.882655172, 25.25, -32.712985573),
    ]]
    fillet(fillet7_edges, radius=FILLET7_R)

    # Sketch16 → Cut-Extrude6 (cut)
    with SkipClean():  # the faces are left unmerged after this step: merging them gives an invalid solid
        with BuildSketch(Plane(origin=(0, 27.65, 0), x_dir=(1, 0, 0), z_dir=(0, 1, 0))):
            Polygon((-14.7, -30.567073624), (-8.3, -30.567073624), (-8.3, -36.567073624), (-8.3, -40.5), (-14.7, -40.5), (-14.7, -36.567073624), align=None)
            Polygon((14.7, -36.567073624), (14.7, -40.5), (8.3, -40.5), (8.3, -36.567073624), (8.3, -30.567073624), (14.7, -30.567073624), align=None)
            Polygon((14.7, 40.5), (8.3, 40.5), (8.3, 36.567073624), (8.3, 30.567073624), (14.7, 30.567073624), (14.7, 36.567073624), align=None)
        extrude(amount=-CUT_EXTRUDE6_DEPTH, mode=Mode.SUBTRACT)

    # Chamfer2
    chamfer2_edges = [part.edges().sort_by_distance(p)[0] for p in [
        (-11.5, 25.15, 40.5),
        (11.5, 25.15, 40.5),
        (11.5, 25.15, -40.5),
    ]]
    chamfer(chamfer2_edges, length=CHAMFER2_SIZE)

    # Cut-Extrude7: up to this plane
    with SkipClean():  # the faces are left unmerged after this step: merging them gives an invalid solid
        cut_extrude7_end = Plane(origin=(66.10512644, -4.540063509, 16.943747687), z_dir=(0, -0.25881904510252485, 0.9659258262890673))
        # Sketch17 → Cut-Extrude7 (cut, up to the surface)
        with BuildSketch(Plane.XY.offset(40.5), mode=Mode.PRIVATE) as cut_extrude7_sk1:
            with Locations((-11.6925, 25.65)):
                Rectangle(SKETCH17_W, SKETCH17_H)
        cut_extrude7_tool1 = split(extrude(cut_extrude7_sk1.sketch, amount=-CUT_EXTRUDE7_REACH, mode=Mode.PRIVATE), bisect_by=cut_extrude7_end, keep=Keep.BOTH, mode=Mode.PRIVATE)
        add(cut_extrude7_tool1.solids().sort_by_distance((-11.6925, 25.65, 40.5))[0], mode=Mode.SUBTRACT)

    # Cut-Extrude8: up to this plane
    with SkipClean():  # the faces are left unmerged after this step: merging them gives an invalid solid
        cut_extrude8_end = Plane(origin=(66.10512644, -4.540063509, -16.943747687), z_dir=(0, 0.25881904510252485, 0.9659258262890673))
        # Sketch19 → Cut-Extrude8 (cut, up to the surface)
        with BuildSketch(Plane(origin=(0, 0, -40.5), x_dir=(-1, 0, 0), z_dir=(0, 0, -1)), mode=Mode.PRIVATE) as cut_extrude8_sk1:
            with Locations((-11.609655173, 25.65)):
                Rectangle(SKETCH19_W, SKETCH19_H)
        cut_extrude8_tool1 = split(extrude(cut_extrude8_sk1.sketch, amount=-CUT_EXTRUDE8_REACH, mode=Mode.PRIVATE), bisect_by=cut_extrude8_end, keep=Keep.BOTH, mode=Mode.PRIVATE)
        add(cut_extrude8_tool1.solids().sort_by_distance((11.609655, 25.65, -40.5))[0], mode=Mode.SUBTRACT)

    # Fillet8
    fillet8_edges = [part.edges().sort_by_distance(p)[0] for p in [
        (-0.165689655, 25.25, -32.712985573),
        (0, 31.65, 33.570422989),
    ]]
    fillet(fillet8_edges, radius=FILLET8_R)


solid = part.part
